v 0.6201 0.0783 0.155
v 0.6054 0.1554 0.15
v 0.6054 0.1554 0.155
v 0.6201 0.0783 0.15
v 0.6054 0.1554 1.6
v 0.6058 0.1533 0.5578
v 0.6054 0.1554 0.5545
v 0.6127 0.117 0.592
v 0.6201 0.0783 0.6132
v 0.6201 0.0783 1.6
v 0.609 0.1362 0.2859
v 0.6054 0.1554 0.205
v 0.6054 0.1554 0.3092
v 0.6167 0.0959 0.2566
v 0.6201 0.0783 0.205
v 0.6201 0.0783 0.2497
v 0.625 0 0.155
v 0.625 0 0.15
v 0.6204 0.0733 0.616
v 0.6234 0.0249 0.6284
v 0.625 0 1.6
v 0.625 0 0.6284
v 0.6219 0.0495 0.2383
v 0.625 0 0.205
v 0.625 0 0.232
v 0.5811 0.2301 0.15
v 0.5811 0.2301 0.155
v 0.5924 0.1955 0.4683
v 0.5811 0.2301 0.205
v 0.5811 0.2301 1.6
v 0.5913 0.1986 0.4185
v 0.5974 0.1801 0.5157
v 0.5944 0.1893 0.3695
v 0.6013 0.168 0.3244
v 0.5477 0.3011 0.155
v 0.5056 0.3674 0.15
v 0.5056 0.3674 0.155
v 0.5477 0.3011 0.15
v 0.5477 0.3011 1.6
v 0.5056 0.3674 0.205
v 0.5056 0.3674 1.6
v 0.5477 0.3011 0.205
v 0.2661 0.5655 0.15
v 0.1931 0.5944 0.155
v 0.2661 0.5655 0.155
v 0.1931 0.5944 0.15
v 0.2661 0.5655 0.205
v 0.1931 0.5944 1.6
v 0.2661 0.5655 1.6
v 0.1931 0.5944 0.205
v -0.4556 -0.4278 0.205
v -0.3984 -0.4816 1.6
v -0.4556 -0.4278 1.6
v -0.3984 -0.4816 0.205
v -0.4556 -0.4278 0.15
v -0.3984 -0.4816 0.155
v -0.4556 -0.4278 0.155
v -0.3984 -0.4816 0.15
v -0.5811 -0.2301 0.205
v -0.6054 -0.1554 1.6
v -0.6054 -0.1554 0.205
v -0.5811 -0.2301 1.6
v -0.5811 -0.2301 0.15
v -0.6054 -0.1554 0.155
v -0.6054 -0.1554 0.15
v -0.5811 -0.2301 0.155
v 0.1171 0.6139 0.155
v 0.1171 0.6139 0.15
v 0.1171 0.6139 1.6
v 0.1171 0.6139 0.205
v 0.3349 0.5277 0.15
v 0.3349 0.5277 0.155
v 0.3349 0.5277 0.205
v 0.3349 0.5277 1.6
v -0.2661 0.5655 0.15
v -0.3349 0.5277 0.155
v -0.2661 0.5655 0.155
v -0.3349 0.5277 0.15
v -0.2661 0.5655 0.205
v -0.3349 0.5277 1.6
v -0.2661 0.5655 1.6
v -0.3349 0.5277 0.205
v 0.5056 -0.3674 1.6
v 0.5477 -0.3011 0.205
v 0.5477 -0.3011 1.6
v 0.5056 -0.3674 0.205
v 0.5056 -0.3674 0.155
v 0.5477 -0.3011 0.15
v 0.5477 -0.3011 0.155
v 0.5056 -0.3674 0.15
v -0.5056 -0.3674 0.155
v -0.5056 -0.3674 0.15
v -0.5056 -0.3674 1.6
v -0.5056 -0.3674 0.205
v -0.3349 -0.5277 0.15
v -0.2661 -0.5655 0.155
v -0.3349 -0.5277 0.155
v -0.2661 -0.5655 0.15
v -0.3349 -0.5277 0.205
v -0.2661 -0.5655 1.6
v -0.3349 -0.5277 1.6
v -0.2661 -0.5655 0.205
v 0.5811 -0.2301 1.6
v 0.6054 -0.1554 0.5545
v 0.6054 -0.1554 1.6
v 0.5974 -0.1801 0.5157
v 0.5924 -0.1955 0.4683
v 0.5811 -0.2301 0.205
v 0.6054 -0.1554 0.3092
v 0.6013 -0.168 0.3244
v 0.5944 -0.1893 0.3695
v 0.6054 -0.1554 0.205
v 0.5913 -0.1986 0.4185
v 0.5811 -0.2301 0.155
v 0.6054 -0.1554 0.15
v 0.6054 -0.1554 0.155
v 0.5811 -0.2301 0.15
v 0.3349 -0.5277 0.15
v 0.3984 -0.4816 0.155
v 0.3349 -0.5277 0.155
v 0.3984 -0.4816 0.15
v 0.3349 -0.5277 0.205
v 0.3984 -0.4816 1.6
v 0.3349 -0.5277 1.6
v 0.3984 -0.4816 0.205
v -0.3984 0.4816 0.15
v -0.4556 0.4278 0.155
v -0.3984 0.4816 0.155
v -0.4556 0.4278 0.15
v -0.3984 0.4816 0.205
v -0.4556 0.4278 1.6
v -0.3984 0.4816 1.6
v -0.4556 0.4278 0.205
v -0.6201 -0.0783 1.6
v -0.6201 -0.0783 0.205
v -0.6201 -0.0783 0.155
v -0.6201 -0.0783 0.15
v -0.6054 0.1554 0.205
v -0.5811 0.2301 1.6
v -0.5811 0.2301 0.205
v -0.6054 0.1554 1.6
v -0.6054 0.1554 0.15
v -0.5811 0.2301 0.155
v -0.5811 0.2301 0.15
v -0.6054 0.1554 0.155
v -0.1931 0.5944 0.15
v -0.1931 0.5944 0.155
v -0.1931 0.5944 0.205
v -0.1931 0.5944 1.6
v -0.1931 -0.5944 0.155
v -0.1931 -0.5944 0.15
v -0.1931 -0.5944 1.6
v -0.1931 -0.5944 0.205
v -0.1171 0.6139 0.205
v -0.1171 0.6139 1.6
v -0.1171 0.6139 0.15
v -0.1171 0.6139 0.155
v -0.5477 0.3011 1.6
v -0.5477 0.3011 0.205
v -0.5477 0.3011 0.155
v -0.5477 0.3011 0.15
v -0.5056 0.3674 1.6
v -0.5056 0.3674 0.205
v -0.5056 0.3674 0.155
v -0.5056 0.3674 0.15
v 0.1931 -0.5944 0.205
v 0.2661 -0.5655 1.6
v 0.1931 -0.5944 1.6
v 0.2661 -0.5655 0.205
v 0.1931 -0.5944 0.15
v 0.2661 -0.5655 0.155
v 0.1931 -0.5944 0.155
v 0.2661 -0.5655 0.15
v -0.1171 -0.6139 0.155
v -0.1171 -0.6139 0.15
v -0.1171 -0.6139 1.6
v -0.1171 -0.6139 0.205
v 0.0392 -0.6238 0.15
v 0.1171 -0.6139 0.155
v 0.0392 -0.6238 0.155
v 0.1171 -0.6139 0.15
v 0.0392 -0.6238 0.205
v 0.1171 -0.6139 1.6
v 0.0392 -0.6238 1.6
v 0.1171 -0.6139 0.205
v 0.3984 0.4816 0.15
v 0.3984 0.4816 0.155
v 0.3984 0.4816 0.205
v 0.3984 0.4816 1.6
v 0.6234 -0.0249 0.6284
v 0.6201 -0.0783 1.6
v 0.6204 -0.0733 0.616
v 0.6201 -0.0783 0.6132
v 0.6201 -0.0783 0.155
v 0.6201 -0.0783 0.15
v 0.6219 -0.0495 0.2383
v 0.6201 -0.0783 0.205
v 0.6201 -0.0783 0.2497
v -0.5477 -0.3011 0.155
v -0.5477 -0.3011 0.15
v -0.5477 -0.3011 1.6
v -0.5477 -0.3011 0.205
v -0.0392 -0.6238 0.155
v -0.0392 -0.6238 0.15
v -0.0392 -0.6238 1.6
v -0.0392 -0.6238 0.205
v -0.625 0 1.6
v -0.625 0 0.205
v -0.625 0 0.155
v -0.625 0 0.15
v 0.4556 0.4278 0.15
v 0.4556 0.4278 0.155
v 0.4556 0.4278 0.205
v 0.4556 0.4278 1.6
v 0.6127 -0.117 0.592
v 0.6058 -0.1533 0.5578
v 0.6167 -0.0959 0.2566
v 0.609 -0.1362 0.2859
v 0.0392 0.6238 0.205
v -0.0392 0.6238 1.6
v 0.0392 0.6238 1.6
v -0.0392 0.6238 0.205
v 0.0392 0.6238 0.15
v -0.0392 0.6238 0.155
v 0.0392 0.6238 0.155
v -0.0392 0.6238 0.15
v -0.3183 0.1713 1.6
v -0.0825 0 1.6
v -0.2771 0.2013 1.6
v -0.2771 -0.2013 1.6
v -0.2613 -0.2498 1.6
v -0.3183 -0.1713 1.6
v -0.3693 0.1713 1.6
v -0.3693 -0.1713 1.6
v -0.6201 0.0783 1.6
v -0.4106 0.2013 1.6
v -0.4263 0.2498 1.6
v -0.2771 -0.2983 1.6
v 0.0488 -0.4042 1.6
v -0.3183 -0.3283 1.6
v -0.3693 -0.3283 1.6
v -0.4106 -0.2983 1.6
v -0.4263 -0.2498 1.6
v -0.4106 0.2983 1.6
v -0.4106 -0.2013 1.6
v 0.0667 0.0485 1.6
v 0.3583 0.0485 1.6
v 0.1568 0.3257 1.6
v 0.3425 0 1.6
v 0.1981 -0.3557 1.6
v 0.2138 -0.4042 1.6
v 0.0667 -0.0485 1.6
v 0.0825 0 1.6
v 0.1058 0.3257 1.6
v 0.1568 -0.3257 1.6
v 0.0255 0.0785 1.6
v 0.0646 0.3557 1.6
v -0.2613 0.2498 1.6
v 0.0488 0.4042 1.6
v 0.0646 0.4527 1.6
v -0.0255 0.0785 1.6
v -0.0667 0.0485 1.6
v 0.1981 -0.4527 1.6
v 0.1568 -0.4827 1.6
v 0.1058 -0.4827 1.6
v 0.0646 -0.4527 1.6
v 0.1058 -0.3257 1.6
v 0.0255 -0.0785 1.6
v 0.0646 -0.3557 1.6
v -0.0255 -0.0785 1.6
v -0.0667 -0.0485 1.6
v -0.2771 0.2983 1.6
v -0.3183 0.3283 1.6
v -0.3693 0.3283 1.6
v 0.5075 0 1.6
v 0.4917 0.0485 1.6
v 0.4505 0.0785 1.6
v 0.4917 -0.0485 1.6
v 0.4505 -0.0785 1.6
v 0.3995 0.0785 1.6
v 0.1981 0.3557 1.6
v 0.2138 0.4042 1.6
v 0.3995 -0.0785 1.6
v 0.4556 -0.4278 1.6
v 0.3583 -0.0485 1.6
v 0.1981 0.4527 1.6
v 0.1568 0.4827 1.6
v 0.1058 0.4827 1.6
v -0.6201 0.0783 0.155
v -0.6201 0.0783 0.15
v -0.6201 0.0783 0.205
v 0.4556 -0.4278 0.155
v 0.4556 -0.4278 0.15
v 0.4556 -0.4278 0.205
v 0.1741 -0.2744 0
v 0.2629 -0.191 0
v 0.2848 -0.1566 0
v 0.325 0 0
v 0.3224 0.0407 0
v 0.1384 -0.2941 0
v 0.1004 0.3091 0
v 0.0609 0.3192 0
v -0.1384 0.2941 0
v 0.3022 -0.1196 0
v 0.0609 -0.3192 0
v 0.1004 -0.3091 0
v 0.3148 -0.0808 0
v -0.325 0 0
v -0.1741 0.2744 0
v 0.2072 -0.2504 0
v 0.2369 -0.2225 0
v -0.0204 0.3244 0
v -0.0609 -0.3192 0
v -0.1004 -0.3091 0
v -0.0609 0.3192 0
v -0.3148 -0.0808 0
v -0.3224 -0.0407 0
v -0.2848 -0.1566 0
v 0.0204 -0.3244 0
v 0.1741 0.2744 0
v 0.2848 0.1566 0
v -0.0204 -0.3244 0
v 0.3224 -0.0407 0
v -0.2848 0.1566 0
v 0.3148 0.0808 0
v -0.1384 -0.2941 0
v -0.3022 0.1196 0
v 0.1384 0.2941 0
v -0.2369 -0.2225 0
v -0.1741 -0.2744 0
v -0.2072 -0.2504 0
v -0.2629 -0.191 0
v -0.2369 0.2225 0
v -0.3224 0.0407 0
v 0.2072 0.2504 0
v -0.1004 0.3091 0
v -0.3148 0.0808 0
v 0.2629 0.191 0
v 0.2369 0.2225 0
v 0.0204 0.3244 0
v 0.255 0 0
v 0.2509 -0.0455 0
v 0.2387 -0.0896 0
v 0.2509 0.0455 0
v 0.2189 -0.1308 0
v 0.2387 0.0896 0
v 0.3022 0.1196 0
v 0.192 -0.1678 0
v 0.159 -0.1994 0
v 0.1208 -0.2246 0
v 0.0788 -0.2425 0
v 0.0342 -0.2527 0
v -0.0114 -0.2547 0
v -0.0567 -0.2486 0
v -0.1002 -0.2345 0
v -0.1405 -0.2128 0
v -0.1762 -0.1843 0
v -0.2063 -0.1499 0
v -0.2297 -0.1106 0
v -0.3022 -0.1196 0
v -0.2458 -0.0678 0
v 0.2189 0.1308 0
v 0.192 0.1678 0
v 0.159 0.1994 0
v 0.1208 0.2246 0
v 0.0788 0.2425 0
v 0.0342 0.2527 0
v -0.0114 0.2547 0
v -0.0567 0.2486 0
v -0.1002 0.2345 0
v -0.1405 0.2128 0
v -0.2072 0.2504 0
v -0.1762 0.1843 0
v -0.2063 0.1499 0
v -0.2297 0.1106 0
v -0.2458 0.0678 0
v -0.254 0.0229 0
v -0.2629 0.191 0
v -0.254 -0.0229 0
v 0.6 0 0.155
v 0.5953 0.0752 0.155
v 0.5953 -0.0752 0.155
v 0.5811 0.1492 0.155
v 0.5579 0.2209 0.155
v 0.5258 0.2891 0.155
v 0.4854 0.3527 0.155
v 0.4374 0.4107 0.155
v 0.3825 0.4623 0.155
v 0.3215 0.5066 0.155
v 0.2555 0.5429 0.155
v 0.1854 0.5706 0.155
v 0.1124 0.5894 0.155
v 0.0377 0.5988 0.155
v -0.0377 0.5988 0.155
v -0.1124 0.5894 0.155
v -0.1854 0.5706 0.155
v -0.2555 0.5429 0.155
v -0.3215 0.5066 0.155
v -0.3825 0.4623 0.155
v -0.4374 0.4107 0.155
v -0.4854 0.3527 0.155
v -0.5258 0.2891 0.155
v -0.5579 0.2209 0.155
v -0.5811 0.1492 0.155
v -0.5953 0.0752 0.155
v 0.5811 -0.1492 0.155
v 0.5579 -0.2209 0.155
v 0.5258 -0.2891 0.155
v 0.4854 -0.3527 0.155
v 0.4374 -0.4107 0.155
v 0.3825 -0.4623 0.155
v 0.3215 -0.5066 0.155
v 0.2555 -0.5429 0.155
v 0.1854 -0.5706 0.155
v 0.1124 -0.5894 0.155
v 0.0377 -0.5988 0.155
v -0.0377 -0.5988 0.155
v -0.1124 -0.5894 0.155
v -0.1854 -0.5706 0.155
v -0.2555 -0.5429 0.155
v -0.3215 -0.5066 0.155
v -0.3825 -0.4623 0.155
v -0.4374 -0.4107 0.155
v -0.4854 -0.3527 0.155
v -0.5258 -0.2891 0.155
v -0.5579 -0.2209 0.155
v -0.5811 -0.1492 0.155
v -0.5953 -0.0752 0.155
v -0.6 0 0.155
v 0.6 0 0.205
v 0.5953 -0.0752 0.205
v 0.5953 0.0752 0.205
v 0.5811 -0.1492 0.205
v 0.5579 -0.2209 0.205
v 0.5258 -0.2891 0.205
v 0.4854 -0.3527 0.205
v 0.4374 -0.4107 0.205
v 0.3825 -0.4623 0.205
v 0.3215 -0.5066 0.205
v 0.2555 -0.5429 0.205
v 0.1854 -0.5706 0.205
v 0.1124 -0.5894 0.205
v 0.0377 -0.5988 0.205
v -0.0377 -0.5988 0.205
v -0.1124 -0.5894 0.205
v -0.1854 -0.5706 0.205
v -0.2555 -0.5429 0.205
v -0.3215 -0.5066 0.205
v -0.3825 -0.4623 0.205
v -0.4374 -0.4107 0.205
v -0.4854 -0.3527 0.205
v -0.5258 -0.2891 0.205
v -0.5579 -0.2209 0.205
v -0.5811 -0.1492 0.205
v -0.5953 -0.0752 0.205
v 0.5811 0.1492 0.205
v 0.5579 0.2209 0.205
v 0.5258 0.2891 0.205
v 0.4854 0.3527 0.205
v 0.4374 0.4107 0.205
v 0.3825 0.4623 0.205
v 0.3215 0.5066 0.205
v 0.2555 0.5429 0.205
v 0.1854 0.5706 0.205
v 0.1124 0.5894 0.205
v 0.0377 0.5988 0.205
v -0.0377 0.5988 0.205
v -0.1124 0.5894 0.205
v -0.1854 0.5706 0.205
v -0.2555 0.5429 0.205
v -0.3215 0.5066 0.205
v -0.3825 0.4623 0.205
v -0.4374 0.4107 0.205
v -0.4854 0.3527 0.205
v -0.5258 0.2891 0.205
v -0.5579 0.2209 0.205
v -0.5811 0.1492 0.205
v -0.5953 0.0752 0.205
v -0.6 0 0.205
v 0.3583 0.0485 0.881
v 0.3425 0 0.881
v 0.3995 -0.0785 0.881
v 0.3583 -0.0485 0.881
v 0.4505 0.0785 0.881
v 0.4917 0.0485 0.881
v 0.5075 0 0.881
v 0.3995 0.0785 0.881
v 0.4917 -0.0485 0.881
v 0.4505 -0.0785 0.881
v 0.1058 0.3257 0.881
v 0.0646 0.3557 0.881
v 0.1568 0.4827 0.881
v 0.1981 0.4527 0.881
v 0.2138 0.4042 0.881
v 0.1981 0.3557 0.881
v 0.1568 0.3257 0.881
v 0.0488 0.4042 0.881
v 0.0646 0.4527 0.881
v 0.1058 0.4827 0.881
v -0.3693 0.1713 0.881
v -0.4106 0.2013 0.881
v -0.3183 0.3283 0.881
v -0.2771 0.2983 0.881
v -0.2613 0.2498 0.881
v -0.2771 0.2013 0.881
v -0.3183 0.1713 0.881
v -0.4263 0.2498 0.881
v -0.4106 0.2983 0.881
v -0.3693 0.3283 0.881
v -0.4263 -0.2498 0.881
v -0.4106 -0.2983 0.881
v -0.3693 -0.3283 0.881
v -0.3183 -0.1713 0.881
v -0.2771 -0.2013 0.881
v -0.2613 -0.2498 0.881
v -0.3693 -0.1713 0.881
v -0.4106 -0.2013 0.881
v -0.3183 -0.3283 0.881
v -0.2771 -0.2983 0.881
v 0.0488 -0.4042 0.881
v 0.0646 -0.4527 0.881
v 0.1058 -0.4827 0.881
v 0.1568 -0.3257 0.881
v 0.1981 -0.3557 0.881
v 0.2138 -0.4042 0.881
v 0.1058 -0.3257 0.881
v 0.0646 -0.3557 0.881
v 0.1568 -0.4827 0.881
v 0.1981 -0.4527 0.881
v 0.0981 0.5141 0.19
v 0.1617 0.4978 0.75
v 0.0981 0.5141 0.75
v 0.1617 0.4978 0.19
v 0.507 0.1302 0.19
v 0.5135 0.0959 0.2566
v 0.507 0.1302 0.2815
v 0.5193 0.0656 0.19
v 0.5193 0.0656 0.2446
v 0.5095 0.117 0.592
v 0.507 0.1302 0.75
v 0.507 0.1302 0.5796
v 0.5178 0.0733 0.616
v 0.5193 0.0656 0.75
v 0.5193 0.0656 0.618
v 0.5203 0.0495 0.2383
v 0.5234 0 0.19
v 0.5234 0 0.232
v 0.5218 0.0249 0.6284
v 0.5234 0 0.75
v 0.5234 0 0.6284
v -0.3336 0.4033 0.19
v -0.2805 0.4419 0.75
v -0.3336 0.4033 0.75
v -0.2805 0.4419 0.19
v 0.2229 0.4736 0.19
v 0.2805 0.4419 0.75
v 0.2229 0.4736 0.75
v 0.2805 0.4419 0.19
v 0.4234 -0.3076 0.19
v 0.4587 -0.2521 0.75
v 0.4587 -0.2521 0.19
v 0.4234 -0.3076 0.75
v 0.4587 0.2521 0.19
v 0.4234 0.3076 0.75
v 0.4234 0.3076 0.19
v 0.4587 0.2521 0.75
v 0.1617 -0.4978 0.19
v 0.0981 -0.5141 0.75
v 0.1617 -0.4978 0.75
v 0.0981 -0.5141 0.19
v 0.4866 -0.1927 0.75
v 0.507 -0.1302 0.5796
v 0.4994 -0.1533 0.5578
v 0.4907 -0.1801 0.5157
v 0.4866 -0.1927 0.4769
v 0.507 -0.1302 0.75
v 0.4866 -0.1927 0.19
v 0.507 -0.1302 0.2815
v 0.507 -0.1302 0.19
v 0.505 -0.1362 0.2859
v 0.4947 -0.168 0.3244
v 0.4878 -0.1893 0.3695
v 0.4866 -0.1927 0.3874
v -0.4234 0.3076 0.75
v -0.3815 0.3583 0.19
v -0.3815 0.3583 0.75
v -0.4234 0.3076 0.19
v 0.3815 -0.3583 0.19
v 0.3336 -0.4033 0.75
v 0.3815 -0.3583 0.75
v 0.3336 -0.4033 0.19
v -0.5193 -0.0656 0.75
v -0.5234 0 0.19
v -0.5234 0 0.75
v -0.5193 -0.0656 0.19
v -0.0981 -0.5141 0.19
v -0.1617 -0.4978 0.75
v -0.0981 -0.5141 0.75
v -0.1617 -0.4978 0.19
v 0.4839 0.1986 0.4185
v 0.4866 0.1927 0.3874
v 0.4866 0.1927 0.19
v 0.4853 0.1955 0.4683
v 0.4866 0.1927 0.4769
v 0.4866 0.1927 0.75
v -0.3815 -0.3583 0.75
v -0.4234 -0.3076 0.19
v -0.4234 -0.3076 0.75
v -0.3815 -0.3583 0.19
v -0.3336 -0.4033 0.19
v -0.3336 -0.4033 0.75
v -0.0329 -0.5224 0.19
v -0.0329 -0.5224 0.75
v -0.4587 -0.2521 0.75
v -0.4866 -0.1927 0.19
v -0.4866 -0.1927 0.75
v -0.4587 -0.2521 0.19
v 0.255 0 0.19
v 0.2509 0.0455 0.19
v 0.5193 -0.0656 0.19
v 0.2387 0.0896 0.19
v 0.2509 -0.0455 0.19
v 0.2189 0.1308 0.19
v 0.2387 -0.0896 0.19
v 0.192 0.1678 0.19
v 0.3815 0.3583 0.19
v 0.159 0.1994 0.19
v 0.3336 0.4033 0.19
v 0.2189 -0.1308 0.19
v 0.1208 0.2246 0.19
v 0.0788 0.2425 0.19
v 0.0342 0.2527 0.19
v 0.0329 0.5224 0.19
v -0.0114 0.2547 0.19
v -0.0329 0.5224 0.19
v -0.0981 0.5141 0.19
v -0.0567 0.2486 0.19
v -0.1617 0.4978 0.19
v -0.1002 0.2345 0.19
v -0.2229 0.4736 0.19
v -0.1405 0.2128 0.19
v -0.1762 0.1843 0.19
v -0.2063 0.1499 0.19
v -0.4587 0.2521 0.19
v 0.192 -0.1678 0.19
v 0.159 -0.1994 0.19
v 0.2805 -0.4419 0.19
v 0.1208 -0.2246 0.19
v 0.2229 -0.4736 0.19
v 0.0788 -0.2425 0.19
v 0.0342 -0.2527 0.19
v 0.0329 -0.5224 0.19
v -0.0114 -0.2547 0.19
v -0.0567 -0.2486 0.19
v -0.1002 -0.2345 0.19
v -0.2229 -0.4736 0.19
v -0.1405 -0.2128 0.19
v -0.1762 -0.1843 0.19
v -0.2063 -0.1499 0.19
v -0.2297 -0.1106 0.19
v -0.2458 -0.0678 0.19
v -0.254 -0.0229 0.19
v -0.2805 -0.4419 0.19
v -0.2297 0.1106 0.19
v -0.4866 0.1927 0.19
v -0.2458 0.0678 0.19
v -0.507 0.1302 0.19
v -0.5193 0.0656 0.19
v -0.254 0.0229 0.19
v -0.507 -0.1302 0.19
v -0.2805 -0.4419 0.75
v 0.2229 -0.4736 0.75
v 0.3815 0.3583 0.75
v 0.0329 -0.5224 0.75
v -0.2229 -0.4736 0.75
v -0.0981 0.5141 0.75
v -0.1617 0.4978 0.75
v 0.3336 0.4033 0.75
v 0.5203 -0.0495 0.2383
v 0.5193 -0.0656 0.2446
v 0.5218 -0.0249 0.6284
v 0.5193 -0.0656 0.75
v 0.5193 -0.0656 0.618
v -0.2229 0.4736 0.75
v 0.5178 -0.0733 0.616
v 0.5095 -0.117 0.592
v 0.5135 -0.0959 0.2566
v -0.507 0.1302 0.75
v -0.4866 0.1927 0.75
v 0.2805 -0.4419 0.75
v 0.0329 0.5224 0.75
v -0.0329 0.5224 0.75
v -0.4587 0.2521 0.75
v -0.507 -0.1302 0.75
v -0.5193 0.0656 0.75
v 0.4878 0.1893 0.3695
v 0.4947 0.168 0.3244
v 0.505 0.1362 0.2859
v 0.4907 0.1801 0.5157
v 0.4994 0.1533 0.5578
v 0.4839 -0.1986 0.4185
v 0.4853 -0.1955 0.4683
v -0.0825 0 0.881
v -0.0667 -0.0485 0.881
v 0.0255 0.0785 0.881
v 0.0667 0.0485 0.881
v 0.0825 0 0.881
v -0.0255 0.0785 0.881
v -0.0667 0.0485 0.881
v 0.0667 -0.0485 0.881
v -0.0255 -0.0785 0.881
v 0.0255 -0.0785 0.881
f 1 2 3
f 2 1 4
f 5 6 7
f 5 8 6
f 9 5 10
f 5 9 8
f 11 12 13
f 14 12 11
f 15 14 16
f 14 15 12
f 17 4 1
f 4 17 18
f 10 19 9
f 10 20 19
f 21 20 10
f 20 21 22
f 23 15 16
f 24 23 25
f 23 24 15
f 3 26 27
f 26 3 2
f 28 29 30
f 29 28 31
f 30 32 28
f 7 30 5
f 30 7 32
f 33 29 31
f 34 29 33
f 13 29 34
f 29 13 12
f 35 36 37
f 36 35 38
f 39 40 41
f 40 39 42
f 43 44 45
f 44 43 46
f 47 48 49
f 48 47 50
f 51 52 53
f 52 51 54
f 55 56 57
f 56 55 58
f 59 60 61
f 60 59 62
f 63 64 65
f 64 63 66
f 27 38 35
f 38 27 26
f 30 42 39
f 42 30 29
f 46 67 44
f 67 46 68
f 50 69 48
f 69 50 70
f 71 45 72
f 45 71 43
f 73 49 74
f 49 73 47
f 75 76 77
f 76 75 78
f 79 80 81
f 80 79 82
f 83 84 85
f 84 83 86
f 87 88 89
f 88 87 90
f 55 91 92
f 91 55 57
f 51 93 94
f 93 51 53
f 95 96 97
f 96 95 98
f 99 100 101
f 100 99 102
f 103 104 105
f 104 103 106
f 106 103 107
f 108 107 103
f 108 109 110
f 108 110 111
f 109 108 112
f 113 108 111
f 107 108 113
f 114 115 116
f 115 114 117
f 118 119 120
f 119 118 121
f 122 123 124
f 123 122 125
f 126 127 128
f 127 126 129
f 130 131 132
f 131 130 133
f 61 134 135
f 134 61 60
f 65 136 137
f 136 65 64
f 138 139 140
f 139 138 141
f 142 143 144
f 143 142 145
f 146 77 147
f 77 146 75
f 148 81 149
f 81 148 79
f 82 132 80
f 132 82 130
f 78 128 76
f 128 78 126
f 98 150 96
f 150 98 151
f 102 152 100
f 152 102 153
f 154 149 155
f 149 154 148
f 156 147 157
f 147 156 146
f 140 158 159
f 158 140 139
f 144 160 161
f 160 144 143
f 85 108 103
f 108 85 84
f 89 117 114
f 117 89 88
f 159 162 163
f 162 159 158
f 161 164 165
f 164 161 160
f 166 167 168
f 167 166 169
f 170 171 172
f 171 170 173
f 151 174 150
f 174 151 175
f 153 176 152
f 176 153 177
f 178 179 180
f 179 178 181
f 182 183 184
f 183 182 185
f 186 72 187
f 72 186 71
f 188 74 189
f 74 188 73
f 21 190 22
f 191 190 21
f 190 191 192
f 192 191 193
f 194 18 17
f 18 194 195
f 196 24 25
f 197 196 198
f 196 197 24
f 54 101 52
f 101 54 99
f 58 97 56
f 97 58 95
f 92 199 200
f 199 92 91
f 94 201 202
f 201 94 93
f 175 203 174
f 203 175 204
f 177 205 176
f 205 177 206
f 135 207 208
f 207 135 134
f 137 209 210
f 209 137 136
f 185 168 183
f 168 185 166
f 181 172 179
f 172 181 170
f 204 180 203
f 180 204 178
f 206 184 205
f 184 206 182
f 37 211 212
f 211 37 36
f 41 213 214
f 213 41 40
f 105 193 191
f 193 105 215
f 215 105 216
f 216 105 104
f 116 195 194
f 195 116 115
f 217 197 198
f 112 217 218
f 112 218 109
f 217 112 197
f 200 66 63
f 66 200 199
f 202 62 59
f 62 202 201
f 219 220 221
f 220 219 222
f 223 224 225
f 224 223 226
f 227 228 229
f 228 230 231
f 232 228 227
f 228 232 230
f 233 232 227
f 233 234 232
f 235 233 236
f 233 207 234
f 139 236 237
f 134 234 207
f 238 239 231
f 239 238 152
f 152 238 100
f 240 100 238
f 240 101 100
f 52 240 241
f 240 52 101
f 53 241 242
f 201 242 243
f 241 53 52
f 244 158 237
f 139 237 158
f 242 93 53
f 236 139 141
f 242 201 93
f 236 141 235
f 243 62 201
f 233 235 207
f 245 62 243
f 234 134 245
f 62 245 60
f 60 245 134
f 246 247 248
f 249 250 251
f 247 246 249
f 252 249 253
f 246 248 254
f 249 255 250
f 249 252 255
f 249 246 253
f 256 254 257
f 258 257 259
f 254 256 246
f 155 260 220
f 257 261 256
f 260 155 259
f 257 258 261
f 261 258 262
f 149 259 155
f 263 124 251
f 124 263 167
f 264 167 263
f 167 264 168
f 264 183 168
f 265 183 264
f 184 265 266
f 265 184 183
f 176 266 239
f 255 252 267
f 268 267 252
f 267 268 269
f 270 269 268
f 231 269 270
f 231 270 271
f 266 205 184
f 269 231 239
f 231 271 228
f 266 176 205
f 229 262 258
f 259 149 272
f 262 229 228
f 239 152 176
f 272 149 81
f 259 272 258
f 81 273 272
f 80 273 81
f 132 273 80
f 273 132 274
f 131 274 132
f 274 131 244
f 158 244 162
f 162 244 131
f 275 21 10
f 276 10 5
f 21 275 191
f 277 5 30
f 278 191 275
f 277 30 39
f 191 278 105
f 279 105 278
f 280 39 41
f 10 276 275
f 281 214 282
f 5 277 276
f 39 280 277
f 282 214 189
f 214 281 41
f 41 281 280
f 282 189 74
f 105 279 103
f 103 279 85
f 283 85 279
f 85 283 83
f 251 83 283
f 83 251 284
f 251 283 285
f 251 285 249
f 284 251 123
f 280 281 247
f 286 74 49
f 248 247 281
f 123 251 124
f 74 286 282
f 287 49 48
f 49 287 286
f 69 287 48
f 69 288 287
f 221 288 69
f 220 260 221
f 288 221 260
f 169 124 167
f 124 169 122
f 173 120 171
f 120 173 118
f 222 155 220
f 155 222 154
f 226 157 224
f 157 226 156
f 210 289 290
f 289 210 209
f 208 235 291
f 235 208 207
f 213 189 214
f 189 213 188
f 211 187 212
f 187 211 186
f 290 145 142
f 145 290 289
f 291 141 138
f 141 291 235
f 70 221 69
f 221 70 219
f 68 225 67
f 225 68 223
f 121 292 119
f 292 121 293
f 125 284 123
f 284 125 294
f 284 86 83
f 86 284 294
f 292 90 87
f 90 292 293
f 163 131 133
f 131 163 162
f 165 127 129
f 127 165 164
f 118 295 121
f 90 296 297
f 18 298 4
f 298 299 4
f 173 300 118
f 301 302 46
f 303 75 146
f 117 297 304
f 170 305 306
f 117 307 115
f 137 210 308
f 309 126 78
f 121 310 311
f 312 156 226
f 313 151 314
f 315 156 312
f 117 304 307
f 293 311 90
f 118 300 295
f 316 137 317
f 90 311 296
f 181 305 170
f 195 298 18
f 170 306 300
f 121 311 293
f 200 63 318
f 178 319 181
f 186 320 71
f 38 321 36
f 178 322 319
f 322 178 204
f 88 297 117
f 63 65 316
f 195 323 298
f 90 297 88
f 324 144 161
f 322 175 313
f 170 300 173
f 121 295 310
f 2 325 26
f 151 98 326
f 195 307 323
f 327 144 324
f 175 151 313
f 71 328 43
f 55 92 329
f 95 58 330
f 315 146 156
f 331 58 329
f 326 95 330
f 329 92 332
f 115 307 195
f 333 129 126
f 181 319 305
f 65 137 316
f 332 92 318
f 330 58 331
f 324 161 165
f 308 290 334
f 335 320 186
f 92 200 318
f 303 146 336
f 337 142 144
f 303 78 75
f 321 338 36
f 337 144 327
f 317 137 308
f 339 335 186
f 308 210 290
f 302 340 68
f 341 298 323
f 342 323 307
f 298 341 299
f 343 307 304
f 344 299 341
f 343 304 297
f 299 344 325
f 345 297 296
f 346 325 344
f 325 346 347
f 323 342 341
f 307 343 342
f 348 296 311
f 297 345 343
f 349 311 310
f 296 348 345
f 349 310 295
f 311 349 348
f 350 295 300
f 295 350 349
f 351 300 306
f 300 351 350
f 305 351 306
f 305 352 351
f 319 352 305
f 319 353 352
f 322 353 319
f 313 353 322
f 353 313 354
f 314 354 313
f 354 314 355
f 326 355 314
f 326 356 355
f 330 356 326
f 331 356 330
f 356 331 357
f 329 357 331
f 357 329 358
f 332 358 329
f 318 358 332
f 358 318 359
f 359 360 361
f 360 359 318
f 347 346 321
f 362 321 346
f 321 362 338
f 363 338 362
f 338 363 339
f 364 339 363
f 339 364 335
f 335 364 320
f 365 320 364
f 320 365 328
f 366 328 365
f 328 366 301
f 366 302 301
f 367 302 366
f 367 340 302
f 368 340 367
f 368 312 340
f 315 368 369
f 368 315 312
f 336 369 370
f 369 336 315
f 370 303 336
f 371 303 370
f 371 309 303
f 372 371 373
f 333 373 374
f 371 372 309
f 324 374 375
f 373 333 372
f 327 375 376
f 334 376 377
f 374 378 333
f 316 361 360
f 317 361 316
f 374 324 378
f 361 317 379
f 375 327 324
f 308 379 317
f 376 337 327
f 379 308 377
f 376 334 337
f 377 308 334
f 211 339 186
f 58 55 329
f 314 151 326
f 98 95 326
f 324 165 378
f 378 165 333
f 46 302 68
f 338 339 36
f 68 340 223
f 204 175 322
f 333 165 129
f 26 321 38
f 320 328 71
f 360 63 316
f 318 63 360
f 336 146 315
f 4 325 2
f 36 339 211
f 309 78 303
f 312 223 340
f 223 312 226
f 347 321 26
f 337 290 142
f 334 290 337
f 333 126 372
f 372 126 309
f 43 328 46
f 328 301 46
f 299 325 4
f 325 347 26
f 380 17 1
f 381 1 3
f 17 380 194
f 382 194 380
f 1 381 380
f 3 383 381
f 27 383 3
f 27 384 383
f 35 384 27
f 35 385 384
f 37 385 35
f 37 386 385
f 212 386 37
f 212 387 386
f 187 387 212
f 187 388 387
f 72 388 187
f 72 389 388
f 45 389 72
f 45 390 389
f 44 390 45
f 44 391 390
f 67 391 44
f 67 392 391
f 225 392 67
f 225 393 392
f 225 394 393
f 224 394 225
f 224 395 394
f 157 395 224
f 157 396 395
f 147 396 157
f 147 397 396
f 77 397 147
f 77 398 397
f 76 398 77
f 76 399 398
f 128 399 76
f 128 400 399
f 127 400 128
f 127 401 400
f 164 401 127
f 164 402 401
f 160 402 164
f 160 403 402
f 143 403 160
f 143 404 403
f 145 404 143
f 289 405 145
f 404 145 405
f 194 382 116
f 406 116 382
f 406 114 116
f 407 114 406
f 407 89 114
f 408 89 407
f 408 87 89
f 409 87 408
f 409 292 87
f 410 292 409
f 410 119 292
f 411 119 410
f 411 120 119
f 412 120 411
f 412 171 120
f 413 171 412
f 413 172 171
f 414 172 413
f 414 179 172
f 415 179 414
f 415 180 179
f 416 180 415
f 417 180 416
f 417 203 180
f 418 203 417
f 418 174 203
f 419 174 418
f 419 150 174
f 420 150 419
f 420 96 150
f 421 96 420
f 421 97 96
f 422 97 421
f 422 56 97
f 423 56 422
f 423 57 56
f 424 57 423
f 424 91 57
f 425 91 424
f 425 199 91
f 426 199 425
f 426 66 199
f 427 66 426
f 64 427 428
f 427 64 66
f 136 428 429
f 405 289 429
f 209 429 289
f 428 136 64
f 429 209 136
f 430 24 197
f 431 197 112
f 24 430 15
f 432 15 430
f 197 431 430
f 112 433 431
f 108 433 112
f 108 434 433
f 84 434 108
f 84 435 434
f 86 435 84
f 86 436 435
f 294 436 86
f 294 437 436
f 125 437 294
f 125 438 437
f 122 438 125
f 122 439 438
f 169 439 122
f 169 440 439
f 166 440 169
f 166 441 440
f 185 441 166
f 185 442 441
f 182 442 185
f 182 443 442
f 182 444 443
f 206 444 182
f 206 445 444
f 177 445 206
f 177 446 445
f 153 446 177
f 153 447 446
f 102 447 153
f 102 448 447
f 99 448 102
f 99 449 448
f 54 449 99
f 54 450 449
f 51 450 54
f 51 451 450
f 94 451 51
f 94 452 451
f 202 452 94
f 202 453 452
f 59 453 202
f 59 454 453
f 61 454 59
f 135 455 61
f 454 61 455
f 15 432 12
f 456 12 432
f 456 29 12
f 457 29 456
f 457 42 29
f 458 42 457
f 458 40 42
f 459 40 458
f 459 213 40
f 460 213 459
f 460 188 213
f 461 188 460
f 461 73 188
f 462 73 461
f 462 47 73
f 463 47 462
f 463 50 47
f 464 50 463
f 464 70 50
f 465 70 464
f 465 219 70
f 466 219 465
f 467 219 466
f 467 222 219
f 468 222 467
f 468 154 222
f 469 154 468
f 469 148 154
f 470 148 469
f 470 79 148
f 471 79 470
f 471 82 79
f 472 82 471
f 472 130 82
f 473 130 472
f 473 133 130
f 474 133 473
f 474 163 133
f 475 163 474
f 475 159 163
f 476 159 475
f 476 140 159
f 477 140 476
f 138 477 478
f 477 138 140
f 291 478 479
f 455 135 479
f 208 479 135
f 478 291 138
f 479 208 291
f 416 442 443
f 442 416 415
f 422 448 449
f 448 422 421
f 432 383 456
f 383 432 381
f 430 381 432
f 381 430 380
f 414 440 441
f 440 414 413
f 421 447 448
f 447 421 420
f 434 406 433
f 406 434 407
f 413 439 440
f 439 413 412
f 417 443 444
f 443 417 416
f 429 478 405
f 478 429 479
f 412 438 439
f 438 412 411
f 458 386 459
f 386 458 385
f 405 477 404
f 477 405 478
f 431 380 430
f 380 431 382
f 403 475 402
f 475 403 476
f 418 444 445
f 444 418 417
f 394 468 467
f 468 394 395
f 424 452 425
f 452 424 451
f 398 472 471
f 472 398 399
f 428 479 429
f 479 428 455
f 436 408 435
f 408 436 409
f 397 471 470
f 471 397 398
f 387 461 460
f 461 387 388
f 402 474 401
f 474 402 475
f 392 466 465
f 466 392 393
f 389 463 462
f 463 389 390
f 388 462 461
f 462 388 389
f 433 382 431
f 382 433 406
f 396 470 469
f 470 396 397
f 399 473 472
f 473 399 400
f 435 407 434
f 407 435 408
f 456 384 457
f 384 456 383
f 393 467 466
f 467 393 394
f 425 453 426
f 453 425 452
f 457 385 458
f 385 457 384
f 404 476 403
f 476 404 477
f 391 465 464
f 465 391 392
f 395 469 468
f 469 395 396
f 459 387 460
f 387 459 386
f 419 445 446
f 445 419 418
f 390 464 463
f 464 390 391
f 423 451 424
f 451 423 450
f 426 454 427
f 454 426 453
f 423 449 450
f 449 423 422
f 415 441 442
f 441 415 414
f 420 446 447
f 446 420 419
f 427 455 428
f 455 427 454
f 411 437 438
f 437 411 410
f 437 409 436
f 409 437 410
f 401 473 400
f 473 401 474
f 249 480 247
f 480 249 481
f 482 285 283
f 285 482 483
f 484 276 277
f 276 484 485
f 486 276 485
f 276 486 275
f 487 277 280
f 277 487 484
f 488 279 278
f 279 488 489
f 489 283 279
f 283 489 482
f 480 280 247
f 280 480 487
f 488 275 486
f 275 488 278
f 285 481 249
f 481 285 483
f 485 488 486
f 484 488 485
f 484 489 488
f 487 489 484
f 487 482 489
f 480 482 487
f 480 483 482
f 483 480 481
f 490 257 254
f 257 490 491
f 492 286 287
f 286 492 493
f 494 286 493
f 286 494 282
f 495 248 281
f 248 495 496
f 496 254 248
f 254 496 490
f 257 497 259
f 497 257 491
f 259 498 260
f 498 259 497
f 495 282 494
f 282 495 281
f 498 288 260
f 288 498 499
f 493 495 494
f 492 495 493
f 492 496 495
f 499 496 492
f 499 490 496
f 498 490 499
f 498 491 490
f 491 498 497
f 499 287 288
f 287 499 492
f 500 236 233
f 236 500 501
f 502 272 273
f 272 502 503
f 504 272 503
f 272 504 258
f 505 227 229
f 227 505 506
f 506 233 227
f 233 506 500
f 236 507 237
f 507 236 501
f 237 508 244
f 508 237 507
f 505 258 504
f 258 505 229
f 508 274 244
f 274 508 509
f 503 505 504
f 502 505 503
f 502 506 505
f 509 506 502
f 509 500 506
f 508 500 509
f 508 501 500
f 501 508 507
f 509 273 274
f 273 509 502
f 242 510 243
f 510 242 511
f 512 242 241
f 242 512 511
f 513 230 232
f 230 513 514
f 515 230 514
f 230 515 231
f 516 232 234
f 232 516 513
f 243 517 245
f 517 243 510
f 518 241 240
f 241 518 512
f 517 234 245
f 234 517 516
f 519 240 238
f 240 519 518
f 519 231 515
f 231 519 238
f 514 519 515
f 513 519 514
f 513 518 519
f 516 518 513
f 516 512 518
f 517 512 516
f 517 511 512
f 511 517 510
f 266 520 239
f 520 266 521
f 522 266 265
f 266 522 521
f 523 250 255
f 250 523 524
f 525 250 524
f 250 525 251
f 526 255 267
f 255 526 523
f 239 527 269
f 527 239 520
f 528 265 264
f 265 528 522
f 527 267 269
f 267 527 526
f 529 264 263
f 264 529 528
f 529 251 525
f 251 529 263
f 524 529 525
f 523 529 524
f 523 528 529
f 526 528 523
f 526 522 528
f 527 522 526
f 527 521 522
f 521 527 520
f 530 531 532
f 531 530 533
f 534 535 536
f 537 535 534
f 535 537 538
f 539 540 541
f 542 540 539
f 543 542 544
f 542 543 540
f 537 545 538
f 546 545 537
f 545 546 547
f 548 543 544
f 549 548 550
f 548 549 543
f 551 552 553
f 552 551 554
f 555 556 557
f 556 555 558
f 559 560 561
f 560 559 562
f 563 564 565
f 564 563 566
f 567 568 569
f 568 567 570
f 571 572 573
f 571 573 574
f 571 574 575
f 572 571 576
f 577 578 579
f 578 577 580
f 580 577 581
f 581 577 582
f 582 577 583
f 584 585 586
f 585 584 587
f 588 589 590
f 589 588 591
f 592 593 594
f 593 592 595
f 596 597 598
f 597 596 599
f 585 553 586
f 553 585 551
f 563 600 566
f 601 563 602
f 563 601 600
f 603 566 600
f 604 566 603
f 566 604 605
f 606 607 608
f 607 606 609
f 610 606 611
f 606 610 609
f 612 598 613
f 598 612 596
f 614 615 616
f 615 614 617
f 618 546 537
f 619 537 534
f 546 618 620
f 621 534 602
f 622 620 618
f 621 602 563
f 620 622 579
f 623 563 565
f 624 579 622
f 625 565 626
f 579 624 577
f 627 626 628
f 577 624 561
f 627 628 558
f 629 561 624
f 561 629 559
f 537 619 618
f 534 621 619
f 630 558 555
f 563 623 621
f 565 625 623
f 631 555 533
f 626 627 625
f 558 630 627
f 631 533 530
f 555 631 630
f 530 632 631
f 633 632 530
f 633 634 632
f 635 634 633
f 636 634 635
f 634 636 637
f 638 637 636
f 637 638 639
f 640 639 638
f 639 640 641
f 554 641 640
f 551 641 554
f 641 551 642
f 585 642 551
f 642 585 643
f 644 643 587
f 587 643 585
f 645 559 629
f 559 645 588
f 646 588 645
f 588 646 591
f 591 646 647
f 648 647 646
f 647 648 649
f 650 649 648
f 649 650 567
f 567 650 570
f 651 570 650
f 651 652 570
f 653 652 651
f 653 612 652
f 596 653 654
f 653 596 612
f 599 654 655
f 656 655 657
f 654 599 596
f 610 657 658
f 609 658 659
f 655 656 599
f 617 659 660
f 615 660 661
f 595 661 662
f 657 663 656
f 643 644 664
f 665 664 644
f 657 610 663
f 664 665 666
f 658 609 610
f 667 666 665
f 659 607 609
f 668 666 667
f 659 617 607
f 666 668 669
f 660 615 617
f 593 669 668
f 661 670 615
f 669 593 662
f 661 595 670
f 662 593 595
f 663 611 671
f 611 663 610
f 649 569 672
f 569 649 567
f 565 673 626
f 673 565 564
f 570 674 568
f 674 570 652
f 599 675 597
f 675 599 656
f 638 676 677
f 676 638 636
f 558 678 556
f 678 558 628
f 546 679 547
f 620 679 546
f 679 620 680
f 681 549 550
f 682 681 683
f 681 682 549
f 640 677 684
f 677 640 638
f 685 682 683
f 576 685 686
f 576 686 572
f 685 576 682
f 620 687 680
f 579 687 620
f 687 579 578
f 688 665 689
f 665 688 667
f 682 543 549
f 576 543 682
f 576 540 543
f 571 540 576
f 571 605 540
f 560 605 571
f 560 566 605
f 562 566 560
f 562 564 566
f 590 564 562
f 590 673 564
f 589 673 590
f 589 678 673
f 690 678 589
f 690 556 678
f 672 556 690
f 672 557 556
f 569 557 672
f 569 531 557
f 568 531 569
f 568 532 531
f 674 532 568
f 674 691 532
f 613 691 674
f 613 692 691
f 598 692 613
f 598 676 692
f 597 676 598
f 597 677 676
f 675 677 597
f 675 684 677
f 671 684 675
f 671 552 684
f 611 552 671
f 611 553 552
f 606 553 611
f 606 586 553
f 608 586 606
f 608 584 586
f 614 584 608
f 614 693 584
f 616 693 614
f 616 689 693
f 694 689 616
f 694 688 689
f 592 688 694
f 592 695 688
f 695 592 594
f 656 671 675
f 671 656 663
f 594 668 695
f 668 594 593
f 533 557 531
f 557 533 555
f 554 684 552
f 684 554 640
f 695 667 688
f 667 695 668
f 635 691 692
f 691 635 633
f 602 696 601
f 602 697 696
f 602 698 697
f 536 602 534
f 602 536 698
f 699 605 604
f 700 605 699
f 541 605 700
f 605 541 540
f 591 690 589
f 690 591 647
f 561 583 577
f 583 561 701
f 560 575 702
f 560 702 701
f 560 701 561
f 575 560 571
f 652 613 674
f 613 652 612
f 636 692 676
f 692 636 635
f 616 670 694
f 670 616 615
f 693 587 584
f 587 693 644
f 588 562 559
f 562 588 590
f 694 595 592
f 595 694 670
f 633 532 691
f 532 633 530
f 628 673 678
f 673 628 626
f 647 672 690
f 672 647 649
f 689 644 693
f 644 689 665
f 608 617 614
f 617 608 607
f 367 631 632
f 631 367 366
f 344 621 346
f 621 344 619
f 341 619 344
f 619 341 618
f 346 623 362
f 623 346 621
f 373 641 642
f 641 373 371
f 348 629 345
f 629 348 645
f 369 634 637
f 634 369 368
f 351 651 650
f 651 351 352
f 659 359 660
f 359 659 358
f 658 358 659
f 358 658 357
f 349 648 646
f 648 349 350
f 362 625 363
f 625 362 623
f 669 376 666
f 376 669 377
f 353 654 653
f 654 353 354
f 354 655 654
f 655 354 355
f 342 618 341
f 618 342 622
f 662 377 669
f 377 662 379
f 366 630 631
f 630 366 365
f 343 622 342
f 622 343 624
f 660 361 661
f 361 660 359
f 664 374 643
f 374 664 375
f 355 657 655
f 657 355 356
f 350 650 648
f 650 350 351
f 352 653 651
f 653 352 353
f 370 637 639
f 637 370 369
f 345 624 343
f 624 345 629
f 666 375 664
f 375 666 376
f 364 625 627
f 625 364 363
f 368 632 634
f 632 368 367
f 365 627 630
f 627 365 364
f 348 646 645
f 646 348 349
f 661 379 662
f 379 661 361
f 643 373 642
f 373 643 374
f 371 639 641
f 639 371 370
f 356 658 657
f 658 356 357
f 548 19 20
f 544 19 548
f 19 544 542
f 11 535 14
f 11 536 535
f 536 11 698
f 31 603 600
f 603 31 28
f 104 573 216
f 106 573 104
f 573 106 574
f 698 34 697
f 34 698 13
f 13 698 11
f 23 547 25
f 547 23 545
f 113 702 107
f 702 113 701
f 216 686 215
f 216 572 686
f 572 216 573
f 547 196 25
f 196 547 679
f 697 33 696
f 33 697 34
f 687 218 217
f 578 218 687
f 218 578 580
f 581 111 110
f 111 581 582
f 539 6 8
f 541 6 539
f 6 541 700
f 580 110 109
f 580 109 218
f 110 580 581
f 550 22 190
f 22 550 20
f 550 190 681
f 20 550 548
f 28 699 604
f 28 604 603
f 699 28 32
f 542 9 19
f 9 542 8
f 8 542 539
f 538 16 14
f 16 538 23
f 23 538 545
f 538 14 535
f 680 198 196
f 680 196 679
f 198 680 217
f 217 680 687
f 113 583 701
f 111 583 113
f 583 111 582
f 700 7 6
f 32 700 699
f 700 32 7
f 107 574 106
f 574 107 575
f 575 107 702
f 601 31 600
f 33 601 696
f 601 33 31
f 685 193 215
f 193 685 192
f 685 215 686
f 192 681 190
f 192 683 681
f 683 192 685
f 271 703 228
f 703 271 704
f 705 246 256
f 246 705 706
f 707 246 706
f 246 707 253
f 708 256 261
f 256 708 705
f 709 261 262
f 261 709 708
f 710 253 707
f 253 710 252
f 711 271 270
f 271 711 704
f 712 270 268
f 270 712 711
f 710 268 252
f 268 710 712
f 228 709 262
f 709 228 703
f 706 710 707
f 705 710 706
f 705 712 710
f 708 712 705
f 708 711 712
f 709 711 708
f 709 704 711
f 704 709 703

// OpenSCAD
$fn = 50;
radius = 0.625;
extent_height = 1.600;
chamfer_height = 0.150;
chamfer_inset = 0.300;

screw_hole_z_offset = 0.431;
screw_hole_r = 0.199;

collar_void = 0.56;
collar_radius = 0.5234;

glue_channel_pattern_radius = radius - 0.2;
glue_channel_radius = 0.0825;
glue_channel_n = 5;
        
difference() {
    union() {
        translate([0,0,chamfer_height])
            cylinder(h=extent_height-chamfer_height,r=radius);
        cylinder(chamfer_height, r1 = radius-chamfer_inset, r2 = radius);
    }


    union() {
        translate([0,0,0.47])
            cylinder(h = collar_void, r=collar_radius, $fn = 50, center = true); 
        
        
        cylinder(h = 0.5, r = .255, $fn = 35, center = true);
        
        translate([radius,0,screw_hole_z_offset])
            rotate([0,90,0])
                cylinder(h=0.5,r=screw_hole_r,center = true,$fn=25);

        difference() {
            translate([0,0,0.18])
                cylinder(h = 0.05, r = .7, center = true);
            translate([0,0,0.18])
                cylinder(h = 0.5, r = 0.60, center = true);
        }
        
        step = 360/glue_channel_n;
        for (i = [0:glue_channel_n-1]) {
          angle = i * step;
          dx = glue_channel_pattern_radius * cos(angle);
          dy = glue_channel_pattern_radius * sin(angle);
          translate([dx, dy, 0.881]) cylinder(extent_height, r=glue_channel_radius, $fn=10);
        }
        
        translate([0, 0, 0.881]) cylinder(extent_height, r=glue_channel_radius, $fn=10);
        
    }
}
